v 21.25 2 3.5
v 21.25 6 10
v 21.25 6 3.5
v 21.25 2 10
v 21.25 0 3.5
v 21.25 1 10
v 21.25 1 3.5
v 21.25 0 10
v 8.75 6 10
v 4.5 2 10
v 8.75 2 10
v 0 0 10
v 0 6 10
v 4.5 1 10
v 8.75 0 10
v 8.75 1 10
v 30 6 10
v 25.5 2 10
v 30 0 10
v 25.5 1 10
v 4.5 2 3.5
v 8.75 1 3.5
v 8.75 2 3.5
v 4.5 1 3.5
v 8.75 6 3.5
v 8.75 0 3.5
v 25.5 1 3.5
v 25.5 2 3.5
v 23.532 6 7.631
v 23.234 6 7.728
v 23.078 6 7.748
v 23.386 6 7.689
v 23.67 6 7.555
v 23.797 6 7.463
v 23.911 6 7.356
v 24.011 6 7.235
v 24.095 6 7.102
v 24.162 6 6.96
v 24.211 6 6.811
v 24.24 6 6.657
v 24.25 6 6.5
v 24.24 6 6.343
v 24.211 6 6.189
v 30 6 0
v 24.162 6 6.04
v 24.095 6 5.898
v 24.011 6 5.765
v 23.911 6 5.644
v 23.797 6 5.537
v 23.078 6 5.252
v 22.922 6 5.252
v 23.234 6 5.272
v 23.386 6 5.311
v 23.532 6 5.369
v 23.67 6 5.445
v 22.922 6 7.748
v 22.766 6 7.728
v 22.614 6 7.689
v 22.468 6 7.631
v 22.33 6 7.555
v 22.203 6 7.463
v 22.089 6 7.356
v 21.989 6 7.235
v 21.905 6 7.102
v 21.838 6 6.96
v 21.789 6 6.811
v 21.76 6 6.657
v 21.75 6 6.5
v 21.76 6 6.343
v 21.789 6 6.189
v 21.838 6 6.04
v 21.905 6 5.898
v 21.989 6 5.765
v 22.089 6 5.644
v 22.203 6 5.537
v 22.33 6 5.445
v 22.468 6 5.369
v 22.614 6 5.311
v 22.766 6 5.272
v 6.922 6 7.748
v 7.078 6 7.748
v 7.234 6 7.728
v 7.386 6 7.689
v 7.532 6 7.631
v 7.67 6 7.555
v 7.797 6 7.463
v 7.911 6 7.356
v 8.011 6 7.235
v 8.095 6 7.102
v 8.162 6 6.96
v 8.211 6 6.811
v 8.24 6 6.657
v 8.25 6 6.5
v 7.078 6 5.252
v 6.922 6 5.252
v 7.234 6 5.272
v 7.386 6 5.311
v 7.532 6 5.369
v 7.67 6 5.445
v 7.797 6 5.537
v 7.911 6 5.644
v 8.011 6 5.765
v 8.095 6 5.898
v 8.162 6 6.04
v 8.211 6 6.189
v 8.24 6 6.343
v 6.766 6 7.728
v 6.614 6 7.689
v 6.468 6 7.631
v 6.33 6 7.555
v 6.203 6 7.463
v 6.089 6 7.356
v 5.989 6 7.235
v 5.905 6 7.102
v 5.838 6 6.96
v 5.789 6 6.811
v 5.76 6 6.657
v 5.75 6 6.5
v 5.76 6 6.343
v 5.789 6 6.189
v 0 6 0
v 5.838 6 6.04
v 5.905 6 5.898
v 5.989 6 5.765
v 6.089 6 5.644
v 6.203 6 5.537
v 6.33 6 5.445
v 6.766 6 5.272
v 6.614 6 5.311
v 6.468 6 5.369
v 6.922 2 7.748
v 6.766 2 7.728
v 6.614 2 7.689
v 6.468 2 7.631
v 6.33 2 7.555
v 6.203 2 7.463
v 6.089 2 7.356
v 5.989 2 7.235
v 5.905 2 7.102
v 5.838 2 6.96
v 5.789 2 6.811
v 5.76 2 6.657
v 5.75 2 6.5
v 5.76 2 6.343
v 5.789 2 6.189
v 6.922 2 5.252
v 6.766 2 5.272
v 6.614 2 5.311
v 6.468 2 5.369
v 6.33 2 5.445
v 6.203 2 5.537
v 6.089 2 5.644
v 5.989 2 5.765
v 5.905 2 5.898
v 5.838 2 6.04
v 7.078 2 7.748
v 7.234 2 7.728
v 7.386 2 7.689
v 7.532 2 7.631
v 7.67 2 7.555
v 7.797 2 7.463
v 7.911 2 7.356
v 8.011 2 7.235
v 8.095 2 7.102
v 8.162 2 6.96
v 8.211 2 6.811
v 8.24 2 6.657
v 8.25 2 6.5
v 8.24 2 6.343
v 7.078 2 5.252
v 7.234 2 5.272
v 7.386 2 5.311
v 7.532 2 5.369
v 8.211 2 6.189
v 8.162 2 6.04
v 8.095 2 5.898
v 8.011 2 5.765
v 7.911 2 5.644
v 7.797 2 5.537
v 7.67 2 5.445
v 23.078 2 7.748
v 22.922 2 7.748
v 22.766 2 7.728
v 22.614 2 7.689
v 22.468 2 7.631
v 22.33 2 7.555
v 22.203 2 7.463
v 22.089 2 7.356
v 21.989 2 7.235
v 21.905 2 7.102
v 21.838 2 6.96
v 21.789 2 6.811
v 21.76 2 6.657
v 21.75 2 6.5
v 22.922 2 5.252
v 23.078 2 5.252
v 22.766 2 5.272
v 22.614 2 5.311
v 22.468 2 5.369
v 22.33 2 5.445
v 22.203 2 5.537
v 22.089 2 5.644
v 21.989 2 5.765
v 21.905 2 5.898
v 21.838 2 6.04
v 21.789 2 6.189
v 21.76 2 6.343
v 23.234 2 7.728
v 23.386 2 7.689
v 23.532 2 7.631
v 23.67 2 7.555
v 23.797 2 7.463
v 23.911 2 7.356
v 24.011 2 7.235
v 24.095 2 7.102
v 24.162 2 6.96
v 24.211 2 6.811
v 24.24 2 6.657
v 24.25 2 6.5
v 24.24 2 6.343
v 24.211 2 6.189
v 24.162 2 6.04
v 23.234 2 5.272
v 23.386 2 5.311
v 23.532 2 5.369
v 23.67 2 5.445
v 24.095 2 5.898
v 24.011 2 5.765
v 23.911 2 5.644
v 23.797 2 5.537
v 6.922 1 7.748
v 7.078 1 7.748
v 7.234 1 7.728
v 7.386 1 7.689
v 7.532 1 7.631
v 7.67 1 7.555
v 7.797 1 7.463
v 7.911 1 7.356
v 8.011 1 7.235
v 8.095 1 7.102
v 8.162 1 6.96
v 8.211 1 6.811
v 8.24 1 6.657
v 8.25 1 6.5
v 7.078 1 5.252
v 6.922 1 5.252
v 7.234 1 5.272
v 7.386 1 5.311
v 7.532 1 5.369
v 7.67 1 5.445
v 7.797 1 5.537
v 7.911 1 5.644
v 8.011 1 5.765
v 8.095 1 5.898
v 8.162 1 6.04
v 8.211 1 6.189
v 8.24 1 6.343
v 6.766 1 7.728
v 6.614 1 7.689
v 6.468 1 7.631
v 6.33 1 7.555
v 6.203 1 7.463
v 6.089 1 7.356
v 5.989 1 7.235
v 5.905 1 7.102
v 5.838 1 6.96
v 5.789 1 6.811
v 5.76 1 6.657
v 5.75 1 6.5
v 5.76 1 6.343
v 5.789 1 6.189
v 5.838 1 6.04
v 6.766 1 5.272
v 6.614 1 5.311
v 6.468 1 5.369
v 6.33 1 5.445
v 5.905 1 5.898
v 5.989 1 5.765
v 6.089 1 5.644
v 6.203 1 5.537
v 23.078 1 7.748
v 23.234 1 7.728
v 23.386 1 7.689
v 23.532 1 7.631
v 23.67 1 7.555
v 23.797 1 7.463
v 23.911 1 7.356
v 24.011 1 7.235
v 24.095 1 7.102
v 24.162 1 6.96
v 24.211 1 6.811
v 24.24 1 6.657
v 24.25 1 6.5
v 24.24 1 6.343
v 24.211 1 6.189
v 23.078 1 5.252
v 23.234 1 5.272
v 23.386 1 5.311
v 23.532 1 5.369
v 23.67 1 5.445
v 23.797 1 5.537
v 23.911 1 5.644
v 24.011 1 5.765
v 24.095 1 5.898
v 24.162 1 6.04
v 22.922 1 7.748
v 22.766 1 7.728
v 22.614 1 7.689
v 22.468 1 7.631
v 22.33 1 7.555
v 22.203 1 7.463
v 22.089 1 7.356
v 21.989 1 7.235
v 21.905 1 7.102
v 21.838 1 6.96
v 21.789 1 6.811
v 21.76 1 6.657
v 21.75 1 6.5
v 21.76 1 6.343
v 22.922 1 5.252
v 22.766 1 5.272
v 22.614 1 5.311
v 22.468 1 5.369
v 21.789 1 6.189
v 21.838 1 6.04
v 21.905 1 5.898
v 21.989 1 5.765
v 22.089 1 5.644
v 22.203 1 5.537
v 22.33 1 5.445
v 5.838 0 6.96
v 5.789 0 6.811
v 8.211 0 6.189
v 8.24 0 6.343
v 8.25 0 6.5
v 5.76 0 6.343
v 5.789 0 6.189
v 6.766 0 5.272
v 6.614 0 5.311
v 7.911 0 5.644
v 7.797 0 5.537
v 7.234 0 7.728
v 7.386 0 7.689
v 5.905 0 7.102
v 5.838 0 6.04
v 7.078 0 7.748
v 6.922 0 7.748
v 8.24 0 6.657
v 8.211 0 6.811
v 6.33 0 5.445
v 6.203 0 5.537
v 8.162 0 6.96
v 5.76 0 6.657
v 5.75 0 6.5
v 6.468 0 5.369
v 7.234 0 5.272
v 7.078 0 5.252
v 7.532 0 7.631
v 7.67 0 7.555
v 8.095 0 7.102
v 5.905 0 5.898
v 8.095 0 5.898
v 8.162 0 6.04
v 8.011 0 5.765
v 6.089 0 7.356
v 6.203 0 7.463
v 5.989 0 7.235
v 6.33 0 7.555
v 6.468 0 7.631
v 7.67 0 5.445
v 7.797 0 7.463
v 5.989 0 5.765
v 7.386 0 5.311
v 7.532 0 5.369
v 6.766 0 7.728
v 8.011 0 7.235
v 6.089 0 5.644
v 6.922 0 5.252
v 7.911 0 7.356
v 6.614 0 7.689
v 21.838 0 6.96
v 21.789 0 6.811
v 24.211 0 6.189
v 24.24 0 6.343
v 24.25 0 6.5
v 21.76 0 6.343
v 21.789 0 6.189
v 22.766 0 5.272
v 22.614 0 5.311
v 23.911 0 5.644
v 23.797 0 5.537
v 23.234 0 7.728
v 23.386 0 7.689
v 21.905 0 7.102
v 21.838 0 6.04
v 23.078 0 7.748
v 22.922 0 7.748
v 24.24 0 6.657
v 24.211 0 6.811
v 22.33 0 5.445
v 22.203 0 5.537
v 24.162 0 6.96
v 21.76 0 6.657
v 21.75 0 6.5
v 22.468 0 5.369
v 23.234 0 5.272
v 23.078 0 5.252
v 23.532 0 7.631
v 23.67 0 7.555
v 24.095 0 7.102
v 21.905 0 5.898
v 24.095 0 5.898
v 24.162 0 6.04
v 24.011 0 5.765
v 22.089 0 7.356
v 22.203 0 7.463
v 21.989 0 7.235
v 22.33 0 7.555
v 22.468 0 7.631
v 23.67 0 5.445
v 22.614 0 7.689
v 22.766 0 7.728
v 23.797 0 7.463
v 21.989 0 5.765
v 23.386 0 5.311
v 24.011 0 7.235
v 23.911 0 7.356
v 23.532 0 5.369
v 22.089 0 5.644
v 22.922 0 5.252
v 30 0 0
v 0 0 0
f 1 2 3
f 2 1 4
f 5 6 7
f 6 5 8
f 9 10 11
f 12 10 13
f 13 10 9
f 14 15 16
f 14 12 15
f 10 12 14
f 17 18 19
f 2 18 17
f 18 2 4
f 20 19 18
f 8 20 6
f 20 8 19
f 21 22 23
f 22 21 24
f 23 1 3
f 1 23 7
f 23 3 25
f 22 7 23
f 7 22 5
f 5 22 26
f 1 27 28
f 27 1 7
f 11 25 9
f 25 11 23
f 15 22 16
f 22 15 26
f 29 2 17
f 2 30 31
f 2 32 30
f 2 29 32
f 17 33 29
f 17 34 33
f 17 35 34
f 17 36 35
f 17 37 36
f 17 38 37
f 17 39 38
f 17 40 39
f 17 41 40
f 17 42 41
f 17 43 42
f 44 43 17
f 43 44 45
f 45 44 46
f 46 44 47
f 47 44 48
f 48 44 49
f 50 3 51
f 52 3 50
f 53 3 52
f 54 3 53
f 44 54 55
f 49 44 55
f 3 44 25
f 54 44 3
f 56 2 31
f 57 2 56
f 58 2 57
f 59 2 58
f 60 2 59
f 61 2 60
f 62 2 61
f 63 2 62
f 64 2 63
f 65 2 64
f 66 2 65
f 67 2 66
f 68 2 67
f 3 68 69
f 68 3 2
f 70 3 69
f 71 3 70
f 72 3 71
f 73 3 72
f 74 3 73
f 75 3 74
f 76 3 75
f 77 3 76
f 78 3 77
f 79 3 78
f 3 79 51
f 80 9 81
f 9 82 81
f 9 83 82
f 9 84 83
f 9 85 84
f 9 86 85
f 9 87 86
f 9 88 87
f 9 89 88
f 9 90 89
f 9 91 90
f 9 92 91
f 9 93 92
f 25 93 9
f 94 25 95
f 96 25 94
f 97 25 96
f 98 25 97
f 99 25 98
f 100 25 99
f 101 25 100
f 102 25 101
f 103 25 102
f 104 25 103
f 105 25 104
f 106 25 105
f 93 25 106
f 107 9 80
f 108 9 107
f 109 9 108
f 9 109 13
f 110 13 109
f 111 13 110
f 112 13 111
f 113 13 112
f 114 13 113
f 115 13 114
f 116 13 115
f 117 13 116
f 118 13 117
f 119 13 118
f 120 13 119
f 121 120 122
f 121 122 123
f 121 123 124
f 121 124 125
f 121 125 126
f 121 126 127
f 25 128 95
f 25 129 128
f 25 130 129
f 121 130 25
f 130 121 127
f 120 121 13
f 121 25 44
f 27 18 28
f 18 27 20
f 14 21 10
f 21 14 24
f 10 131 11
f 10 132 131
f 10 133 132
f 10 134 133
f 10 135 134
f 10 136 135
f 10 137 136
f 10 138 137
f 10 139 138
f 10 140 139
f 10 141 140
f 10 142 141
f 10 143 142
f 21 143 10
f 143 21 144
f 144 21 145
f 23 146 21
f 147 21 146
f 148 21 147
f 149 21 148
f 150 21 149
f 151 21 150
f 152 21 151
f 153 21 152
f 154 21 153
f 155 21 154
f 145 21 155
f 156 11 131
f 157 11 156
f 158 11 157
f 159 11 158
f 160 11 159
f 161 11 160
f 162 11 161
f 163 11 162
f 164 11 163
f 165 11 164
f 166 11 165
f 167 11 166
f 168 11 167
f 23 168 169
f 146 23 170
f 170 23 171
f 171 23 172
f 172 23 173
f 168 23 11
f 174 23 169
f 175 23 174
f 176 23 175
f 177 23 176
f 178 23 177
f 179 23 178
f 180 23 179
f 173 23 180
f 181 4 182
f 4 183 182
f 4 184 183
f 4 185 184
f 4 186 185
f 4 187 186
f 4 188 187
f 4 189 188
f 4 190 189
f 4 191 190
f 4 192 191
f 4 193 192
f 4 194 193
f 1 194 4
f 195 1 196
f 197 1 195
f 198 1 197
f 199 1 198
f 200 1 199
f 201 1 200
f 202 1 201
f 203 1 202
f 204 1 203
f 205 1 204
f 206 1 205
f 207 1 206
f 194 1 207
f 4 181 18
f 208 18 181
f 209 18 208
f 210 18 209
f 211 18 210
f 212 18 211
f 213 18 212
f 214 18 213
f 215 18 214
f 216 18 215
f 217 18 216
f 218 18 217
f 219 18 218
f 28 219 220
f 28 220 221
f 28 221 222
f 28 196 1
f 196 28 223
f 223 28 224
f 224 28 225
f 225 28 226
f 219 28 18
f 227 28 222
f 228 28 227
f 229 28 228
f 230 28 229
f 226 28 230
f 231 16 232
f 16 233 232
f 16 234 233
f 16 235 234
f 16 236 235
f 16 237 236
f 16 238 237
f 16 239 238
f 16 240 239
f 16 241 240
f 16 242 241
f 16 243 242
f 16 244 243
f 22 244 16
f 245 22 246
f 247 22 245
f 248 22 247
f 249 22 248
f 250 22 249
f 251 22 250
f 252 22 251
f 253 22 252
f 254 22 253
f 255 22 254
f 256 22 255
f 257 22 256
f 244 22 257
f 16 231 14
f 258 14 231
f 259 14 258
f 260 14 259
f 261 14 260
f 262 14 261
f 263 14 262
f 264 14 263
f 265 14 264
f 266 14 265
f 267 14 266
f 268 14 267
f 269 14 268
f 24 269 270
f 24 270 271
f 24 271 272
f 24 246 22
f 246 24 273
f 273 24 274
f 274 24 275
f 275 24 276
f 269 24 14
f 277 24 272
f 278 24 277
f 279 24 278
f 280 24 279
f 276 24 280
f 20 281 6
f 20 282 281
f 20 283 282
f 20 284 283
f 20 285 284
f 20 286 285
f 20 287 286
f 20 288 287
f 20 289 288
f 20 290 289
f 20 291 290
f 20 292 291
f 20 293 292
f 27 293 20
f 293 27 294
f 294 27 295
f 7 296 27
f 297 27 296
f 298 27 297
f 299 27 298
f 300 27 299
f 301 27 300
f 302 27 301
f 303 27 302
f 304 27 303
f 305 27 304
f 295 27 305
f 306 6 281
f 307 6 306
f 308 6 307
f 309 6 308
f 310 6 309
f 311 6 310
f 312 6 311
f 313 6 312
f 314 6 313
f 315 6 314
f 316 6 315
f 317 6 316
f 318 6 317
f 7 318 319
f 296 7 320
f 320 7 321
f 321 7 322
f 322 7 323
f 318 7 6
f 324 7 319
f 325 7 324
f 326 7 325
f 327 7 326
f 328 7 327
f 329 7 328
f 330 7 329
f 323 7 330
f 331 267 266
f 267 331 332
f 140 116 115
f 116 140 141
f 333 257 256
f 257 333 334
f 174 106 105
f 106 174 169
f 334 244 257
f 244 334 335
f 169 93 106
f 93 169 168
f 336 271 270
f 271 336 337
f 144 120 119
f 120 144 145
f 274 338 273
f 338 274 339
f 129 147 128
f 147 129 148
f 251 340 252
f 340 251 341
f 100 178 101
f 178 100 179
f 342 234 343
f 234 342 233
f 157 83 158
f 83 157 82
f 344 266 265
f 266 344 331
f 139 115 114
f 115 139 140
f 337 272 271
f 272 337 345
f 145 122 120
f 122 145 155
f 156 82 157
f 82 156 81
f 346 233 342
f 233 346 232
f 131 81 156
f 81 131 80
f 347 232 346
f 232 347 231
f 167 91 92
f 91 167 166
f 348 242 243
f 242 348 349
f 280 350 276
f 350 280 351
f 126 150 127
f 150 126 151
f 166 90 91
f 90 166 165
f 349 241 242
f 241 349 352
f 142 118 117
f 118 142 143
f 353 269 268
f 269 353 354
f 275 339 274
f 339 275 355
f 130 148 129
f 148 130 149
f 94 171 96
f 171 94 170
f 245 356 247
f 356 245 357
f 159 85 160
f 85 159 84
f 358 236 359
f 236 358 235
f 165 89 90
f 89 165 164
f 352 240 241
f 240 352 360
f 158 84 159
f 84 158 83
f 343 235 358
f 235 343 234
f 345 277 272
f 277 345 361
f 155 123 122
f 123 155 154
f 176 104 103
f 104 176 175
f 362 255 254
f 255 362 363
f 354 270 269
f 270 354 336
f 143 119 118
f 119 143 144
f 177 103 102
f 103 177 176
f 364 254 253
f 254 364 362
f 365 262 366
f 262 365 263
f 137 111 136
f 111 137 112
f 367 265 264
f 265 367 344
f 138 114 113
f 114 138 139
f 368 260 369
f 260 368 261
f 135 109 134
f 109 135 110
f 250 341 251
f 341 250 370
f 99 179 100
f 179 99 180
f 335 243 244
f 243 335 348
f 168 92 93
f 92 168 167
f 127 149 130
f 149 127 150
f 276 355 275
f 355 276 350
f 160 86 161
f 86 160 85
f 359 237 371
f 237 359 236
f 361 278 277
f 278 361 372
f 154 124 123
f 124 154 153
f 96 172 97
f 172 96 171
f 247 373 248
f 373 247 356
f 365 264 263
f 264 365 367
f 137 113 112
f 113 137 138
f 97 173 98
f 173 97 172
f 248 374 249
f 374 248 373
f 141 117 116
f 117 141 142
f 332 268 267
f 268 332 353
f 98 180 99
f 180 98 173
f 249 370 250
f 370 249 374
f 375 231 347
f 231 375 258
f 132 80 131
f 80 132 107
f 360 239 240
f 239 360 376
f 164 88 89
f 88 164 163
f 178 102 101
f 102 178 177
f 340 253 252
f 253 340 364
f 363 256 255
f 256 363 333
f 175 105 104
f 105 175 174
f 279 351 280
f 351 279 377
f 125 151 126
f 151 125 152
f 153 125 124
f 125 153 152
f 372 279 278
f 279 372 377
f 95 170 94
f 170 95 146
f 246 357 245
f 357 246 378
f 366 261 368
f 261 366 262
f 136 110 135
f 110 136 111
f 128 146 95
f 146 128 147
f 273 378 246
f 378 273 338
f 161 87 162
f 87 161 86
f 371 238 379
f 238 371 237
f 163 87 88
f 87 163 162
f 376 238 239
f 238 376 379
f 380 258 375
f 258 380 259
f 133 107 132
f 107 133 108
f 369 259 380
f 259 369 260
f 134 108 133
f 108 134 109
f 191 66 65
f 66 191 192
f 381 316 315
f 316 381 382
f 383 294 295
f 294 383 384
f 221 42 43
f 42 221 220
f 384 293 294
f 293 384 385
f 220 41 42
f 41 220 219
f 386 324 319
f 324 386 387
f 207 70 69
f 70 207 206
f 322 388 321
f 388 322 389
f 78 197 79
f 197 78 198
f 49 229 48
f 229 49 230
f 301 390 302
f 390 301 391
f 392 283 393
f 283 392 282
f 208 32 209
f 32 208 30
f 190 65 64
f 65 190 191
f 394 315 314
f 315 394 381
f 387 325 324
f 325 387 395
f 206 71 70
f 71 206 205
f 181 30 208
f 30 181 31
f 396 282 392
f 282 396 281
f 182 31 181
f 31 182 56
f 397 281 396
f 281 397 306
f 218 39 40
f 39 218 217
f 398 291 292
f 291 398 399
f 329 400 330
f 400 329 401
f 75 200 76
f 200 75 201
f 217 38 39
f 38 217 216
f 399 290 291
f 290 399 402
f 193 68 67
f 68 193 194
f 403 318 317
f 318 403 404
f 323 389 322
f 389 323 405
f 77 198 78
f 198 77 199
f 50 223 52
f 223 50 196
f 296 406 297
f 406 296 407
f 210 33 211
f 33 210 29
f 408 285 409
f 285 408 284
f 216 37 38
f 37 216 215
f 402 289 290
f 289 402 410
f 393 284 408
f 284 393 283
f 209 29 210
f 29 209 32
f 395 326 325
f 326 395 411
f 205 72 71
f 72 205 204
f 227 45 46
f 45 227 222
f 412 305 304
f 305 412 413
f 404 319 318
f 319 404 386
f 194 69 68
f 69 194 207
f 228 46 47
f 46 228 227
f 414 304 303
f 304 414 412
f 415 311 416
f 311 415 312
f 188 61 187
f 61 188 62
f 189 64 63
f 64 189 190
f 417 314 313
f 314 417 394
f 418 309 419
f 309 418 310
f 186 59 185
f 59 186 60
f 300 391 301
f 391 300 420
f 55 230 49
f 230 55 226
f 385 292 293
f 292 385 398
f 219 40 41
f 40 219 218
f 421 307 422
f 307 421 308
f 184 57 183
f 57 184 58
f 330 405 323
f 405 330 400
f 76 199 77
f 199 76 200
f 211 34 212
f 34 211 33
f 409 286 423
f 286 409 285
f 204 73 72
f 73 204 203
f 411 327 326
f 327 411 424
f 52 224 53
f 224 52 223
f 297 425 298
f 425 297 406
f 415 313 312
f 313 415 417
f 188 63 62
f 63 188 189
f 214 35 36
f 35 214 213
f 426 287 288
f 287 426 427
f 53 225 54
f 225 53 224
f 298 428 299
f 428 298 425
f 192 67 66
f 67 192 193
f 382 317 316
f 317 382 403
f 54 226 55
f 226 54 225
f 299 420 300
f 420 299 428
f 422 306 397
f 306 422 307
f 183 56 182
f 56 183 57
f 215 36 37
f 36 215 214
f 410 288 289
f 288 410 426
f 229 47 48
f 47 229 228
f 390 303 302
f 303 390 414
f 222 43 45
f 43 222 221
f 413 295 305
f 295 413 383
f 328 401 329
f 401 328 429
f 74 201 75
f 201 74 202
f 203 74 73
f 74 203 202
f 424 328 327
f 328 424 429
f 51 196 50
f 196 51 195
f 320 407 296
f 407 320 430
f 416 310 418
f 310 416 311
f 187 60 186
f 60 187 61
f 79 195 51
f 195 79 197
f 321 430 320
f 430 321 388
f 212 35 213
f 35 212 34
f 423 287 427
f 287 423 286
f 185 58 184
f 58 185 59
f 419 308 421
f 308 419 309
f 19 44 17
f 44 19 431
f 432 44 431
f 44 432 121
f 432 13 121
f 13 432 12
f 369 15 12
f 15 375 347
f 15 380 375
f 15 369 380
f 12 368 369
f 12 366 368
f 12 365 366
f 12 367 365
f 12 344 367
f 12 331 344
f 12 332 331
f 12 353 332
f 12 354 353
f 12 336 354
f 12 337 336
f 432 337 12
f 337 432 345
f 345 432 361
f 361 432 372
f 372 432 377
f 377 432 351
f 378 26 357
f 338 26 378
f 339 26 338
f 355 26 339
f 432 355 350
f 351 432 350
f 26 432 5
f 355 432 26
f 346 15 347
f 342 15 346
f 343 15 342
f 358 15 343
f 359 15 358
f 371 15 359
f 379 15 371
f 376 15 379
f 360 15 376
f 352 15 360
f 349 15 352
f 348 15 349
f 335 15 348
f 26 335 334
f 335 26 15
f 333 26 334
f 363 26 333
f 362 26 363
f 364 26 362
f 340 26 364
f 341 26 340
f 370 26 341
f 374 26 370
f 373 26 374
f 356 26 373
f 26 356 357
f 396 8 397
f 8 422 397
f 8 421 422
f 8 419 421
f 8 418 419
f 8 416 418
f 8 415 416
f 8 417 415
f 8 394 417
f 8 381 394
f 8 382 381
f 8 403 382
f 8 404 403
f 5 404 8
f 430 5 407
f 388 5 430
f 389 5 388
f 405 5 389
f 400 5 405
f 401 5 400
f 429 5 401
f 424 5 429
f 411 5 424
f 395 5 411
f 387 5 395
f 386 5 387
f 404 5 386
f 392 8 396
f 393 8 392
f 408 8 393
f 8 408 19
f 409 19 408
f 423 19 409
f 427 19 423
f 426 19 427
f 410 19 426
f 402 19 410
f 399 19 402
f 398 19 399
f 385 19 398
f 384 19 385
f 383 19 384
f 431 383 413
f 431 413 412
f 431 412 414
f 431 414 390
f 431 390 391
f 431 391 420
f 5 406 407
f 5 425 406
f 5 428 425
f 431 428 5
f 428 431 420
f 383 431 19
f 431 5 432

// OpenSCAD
/*
	swicht mount for 'ON' switch

	2015 by ChrisMicro
*/

$fn=50;

ManufactoringTolerance=1;

mountX=30;
mountY=6;
mountZ=10;
mountFrontThickness=1;


swBodyX          = ManufactoringTolerance +  11.5;
swHeigth         = ManufactoringTolerance +   5.5;
swBodyY          =                             10;
swPlateX         = ManufactoringTolerance +    20;
swPlateYOffset   =                              5;
swPlateThickness =                              1;
swLength         =                             10;
drilling         =                            2.5;
drillingPosX     =                            2.5;
drillingPosY     = ManufactoringTolerance/2 + 2.5;


switchMount();
//switchModel();

module switchMount()
{
	difference()
	{
		cube([mountX,mountY,mountZ]);
		translate([(mountX-swPlateX)/2,-4,mountZ-swHeigth]) switchModel();
	}
}

module switchModel()
{
	// body
	translate([(swPlateX-swBodyX)/2,0,0])cube([swBodyX,swBodyY,swHeigth]);
	// plate
	translate([0,swPlateYOffset,0])cube([swPlateX,swPlateThickness,swHeigth]);
	// drilling 1
	translate([drillingPosX,0,drillingPosY]) rotate([270,0,0])cylinder(h=swBodyY,r=drilling/2);
	// drilling 2
	translate([swPlateX-drillingPosX,0,drillingPosY]) rotate([270,0,0])cylinder(h=swBodyY,r=drilling/2);
}
